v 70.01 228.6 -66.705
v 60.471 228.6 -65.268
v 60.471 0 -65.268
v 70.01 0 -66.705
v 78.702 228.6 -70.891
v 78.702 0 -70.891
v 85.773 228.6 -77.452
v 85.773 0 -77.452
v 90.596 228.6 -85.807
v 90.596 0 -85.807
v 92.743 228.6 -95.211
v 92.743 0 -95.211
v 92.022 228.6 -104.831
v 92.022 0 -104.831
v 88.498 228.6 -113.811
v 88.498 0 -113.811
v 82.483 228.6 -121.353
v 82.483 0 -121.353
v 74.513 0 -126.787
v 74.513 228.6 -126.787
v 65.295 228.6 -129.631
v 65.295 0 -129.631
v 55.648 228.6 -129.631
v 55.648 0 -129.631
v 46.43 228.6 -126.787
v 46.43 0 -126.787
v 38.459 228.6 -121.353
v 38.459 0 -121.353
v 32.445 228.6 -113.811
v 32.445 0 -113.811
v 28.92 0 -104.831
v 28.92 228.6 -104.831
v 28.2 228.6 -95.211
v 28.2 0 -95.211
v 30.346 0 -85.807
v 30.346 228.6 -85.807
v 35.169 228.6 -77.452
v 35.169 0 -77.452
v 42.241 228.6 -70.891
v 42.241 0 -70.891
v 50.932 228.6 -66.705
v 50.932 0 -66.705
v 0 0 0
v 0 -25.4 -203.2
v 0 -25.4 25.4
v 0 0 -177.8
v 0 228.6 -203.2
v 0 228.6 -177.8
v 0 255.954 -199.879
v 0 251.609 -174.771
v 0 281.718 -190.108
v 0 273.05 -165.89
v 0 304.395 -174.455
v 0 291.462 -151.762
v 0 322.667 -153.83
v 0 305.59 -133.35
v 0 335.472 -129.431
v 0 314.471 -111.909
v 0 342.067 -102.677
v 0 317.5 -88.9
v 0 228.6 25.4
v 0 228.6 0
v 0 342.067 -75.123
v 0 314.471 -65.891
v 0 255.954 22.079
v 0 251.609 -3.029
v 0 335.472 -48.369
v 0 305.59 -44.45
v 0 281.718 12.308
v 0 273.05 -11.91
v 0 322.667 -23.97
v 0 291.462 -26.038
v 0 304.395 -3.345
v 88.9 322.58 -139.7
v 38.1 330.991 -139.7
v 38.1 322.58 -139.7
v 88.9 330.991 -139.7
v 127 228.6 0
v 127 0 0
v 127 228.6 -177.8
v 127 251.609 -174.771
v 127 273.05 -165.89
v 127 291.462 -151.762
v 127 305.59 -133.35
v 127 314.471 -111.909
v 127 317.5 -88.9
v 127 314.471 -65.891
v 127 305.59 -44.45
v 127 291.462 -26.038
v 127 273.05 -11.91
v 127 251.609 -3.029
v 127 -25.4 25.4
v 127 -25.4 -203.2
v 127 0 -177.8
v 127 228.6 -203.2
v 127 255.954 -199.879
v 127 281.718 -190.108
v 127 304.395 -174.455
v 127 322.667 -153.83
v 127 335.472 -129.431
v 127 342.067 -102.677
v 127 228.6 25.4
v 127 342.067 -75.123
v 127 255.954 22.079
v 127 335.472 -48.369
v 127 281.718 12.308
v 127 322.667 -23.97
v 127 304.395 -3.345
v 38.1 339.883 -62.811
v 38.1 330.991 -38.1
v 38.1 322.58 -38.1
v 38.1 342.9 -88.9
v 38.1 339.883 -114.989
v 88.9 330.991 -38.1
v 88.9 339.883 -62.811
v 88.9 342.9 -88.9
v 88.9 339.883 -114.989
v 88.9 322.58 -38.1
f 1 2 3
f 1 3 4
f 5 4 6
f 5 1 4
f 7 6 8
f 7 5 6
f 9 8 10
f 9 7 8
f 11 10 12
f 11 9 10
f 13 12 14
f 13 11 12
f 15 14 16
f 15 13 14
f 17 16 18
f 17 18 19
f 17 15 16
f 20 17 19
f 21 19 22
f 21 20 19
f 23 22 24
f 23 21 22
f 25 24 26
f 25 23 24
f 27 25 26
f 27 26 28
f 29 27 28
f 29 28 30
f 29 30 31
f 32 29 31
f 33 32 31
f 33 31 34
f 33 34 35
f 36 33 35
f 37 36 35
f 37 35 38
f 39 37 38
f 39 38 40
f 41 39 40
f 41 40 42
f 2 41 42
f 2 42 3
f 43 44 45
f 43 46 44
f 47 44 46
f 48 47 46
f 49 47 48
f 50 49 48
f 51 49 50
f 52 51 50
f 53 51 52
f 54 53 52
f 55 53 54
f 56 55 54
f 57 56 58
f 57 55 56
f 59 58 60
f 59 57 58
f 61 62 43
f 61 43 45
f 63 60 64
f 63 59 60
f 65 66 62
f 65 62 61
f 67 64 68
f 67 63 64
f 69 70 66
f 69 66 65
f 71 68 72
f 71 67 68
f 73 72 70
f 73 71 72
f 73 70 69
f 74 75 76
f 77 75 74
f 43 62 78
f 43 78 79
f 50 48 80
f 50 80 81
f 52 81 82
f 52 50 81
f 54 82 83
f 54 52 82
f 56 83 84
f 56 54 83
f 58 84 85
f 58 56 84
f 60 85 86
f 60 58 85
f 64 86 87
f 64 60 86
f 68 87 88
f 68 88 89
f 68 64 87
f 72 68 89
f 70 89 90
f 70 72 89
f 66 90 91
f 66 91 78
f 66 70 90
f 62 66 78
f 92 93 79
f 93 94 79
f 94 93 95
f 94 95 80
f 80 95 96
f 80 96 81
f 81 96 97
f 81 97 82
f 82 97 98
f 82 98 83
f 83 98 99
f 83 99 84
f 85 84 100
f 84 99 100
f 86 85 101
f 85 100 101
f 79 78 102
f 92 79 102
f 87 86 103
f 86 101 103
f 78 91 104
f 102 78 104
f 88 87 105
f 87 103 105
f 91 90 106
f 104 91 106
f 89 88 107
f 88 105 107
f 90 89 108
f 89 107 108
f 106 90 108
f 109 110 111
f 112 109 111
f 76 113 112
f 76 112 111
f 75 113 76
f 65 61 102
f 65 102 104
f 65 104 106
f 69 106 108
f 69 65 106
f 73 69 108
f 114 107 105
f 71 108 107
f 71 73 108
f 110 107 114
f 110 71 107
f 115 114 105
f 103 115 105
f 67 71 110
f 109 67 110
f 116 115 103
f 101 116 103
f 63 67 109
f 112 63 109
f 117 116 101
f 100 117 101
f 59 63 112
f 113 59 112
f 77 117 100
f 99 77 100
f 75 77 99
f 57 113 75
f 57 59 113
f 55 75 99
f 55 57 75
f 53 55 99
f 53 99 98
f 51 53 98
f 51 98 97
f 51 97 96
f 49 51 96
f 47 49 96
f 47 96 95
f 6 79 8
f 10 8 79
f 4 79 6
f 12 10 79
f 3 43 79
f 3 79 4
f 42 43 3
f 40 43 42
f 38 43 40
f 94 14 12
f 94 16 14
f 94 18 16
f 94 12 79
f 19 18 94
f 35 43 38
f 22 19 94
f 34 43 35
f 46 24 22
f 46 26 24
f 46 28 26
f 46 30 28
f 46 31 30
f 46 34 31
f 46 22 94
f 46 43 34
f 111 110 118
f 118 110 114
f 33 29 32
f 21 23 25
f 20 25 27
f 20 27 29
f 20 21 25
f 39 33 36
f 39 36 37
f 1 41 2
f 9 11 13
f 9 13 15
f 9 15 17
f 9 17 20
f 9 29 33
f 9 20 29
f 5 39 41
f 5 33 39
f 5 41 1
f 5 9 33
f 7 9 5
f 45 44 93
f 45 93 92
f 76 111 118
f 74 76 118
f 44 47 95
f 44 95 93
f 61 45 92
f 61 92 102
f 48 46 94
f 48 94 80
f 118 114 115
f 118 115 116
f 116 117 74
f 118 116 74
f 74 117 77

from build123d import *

# Parameters (mm, degrees)
BOSS_EXTRUDE1_DEPTH = 127
SKETCH2_W           = 50.8
SKETCH2_H           = 101.6
CUT_EXTRUDE1_DEPTH  = 20.32
BOSS_EXTRUDE2_REACH = 351.192
SKETCH3_R           = 32.362244647


with BuildPart() as part:
    # Sketch1 → Boss-Extrude1 (new body)
    with BuildSketch(Plane(origin=(0, 0, 0), x_dir=(0, 0, -1), z_dir=(1, 0, 0))):
        with BuildLine():
            Line((-25.4, -25.4), (-25.4, 228.6))
            ThreePointArc((-25.4, 228.6), (88.9, 342.9), (203.2, 228.6))
            Line((203.2, 228.6), (203.2, -25.4))
            Line((203.2, -25.4), (-25.4, -25.4))
        make_face()
        with BuildLine():
            Line((0, 0), (177.8, 0))
            Line((177.8, 0), (177.8, 228.6))
            ThreePointArc((177.8, 228.6), (88.9, 317.5), (0, 228.6))
            Line((0, 228.6), (0, 0))
        make_face(mode=Mode.SUBTRACT)
    extrude(amount=BOSS_EXTRUDE1_DEPTH)

    # Sketch2 → Cut-Extrude1 (cut)
    with BuildSketch(Plane(origin=(0, 342.9, 0), x_dir=(1, 0, 0), z_dir=(0, 1, 0))):
        with Locations((63.5, 88.9)):
            Rectangle(SKETCH2_W, SKETCH2_H)
    extrude(amount=-CUT_EXTRUDE1_DEPTH, mode=Mode.SUBTRACT)

    # Sketch3 → Boss-Extrude2 (add, up to next)
    with BuildSketch(Plane(origin=(0, 228.6, 0), x_dir=(1, 0, 0), z_dir=(0, 1, 0)), mode=Mode.PRIVATE) as boss_extrude2_sk1:
        with Locations(Location((60.471295446, 97.62979548, 0), (0, 0, 270))):
            Circle(SKETCH3_R)
    boss_extrude2_tool1 = extrude(boss_extrude2_sk1.sketch, amount=-BOSS_EXTRUDE2_REACH, mode=Mode.PRIVATE) - part.part
    add(boss_extrude2_tool1.solids().sort_by_distance((60.471295, 228.6, -97.629795))[0])


solid = part.part
